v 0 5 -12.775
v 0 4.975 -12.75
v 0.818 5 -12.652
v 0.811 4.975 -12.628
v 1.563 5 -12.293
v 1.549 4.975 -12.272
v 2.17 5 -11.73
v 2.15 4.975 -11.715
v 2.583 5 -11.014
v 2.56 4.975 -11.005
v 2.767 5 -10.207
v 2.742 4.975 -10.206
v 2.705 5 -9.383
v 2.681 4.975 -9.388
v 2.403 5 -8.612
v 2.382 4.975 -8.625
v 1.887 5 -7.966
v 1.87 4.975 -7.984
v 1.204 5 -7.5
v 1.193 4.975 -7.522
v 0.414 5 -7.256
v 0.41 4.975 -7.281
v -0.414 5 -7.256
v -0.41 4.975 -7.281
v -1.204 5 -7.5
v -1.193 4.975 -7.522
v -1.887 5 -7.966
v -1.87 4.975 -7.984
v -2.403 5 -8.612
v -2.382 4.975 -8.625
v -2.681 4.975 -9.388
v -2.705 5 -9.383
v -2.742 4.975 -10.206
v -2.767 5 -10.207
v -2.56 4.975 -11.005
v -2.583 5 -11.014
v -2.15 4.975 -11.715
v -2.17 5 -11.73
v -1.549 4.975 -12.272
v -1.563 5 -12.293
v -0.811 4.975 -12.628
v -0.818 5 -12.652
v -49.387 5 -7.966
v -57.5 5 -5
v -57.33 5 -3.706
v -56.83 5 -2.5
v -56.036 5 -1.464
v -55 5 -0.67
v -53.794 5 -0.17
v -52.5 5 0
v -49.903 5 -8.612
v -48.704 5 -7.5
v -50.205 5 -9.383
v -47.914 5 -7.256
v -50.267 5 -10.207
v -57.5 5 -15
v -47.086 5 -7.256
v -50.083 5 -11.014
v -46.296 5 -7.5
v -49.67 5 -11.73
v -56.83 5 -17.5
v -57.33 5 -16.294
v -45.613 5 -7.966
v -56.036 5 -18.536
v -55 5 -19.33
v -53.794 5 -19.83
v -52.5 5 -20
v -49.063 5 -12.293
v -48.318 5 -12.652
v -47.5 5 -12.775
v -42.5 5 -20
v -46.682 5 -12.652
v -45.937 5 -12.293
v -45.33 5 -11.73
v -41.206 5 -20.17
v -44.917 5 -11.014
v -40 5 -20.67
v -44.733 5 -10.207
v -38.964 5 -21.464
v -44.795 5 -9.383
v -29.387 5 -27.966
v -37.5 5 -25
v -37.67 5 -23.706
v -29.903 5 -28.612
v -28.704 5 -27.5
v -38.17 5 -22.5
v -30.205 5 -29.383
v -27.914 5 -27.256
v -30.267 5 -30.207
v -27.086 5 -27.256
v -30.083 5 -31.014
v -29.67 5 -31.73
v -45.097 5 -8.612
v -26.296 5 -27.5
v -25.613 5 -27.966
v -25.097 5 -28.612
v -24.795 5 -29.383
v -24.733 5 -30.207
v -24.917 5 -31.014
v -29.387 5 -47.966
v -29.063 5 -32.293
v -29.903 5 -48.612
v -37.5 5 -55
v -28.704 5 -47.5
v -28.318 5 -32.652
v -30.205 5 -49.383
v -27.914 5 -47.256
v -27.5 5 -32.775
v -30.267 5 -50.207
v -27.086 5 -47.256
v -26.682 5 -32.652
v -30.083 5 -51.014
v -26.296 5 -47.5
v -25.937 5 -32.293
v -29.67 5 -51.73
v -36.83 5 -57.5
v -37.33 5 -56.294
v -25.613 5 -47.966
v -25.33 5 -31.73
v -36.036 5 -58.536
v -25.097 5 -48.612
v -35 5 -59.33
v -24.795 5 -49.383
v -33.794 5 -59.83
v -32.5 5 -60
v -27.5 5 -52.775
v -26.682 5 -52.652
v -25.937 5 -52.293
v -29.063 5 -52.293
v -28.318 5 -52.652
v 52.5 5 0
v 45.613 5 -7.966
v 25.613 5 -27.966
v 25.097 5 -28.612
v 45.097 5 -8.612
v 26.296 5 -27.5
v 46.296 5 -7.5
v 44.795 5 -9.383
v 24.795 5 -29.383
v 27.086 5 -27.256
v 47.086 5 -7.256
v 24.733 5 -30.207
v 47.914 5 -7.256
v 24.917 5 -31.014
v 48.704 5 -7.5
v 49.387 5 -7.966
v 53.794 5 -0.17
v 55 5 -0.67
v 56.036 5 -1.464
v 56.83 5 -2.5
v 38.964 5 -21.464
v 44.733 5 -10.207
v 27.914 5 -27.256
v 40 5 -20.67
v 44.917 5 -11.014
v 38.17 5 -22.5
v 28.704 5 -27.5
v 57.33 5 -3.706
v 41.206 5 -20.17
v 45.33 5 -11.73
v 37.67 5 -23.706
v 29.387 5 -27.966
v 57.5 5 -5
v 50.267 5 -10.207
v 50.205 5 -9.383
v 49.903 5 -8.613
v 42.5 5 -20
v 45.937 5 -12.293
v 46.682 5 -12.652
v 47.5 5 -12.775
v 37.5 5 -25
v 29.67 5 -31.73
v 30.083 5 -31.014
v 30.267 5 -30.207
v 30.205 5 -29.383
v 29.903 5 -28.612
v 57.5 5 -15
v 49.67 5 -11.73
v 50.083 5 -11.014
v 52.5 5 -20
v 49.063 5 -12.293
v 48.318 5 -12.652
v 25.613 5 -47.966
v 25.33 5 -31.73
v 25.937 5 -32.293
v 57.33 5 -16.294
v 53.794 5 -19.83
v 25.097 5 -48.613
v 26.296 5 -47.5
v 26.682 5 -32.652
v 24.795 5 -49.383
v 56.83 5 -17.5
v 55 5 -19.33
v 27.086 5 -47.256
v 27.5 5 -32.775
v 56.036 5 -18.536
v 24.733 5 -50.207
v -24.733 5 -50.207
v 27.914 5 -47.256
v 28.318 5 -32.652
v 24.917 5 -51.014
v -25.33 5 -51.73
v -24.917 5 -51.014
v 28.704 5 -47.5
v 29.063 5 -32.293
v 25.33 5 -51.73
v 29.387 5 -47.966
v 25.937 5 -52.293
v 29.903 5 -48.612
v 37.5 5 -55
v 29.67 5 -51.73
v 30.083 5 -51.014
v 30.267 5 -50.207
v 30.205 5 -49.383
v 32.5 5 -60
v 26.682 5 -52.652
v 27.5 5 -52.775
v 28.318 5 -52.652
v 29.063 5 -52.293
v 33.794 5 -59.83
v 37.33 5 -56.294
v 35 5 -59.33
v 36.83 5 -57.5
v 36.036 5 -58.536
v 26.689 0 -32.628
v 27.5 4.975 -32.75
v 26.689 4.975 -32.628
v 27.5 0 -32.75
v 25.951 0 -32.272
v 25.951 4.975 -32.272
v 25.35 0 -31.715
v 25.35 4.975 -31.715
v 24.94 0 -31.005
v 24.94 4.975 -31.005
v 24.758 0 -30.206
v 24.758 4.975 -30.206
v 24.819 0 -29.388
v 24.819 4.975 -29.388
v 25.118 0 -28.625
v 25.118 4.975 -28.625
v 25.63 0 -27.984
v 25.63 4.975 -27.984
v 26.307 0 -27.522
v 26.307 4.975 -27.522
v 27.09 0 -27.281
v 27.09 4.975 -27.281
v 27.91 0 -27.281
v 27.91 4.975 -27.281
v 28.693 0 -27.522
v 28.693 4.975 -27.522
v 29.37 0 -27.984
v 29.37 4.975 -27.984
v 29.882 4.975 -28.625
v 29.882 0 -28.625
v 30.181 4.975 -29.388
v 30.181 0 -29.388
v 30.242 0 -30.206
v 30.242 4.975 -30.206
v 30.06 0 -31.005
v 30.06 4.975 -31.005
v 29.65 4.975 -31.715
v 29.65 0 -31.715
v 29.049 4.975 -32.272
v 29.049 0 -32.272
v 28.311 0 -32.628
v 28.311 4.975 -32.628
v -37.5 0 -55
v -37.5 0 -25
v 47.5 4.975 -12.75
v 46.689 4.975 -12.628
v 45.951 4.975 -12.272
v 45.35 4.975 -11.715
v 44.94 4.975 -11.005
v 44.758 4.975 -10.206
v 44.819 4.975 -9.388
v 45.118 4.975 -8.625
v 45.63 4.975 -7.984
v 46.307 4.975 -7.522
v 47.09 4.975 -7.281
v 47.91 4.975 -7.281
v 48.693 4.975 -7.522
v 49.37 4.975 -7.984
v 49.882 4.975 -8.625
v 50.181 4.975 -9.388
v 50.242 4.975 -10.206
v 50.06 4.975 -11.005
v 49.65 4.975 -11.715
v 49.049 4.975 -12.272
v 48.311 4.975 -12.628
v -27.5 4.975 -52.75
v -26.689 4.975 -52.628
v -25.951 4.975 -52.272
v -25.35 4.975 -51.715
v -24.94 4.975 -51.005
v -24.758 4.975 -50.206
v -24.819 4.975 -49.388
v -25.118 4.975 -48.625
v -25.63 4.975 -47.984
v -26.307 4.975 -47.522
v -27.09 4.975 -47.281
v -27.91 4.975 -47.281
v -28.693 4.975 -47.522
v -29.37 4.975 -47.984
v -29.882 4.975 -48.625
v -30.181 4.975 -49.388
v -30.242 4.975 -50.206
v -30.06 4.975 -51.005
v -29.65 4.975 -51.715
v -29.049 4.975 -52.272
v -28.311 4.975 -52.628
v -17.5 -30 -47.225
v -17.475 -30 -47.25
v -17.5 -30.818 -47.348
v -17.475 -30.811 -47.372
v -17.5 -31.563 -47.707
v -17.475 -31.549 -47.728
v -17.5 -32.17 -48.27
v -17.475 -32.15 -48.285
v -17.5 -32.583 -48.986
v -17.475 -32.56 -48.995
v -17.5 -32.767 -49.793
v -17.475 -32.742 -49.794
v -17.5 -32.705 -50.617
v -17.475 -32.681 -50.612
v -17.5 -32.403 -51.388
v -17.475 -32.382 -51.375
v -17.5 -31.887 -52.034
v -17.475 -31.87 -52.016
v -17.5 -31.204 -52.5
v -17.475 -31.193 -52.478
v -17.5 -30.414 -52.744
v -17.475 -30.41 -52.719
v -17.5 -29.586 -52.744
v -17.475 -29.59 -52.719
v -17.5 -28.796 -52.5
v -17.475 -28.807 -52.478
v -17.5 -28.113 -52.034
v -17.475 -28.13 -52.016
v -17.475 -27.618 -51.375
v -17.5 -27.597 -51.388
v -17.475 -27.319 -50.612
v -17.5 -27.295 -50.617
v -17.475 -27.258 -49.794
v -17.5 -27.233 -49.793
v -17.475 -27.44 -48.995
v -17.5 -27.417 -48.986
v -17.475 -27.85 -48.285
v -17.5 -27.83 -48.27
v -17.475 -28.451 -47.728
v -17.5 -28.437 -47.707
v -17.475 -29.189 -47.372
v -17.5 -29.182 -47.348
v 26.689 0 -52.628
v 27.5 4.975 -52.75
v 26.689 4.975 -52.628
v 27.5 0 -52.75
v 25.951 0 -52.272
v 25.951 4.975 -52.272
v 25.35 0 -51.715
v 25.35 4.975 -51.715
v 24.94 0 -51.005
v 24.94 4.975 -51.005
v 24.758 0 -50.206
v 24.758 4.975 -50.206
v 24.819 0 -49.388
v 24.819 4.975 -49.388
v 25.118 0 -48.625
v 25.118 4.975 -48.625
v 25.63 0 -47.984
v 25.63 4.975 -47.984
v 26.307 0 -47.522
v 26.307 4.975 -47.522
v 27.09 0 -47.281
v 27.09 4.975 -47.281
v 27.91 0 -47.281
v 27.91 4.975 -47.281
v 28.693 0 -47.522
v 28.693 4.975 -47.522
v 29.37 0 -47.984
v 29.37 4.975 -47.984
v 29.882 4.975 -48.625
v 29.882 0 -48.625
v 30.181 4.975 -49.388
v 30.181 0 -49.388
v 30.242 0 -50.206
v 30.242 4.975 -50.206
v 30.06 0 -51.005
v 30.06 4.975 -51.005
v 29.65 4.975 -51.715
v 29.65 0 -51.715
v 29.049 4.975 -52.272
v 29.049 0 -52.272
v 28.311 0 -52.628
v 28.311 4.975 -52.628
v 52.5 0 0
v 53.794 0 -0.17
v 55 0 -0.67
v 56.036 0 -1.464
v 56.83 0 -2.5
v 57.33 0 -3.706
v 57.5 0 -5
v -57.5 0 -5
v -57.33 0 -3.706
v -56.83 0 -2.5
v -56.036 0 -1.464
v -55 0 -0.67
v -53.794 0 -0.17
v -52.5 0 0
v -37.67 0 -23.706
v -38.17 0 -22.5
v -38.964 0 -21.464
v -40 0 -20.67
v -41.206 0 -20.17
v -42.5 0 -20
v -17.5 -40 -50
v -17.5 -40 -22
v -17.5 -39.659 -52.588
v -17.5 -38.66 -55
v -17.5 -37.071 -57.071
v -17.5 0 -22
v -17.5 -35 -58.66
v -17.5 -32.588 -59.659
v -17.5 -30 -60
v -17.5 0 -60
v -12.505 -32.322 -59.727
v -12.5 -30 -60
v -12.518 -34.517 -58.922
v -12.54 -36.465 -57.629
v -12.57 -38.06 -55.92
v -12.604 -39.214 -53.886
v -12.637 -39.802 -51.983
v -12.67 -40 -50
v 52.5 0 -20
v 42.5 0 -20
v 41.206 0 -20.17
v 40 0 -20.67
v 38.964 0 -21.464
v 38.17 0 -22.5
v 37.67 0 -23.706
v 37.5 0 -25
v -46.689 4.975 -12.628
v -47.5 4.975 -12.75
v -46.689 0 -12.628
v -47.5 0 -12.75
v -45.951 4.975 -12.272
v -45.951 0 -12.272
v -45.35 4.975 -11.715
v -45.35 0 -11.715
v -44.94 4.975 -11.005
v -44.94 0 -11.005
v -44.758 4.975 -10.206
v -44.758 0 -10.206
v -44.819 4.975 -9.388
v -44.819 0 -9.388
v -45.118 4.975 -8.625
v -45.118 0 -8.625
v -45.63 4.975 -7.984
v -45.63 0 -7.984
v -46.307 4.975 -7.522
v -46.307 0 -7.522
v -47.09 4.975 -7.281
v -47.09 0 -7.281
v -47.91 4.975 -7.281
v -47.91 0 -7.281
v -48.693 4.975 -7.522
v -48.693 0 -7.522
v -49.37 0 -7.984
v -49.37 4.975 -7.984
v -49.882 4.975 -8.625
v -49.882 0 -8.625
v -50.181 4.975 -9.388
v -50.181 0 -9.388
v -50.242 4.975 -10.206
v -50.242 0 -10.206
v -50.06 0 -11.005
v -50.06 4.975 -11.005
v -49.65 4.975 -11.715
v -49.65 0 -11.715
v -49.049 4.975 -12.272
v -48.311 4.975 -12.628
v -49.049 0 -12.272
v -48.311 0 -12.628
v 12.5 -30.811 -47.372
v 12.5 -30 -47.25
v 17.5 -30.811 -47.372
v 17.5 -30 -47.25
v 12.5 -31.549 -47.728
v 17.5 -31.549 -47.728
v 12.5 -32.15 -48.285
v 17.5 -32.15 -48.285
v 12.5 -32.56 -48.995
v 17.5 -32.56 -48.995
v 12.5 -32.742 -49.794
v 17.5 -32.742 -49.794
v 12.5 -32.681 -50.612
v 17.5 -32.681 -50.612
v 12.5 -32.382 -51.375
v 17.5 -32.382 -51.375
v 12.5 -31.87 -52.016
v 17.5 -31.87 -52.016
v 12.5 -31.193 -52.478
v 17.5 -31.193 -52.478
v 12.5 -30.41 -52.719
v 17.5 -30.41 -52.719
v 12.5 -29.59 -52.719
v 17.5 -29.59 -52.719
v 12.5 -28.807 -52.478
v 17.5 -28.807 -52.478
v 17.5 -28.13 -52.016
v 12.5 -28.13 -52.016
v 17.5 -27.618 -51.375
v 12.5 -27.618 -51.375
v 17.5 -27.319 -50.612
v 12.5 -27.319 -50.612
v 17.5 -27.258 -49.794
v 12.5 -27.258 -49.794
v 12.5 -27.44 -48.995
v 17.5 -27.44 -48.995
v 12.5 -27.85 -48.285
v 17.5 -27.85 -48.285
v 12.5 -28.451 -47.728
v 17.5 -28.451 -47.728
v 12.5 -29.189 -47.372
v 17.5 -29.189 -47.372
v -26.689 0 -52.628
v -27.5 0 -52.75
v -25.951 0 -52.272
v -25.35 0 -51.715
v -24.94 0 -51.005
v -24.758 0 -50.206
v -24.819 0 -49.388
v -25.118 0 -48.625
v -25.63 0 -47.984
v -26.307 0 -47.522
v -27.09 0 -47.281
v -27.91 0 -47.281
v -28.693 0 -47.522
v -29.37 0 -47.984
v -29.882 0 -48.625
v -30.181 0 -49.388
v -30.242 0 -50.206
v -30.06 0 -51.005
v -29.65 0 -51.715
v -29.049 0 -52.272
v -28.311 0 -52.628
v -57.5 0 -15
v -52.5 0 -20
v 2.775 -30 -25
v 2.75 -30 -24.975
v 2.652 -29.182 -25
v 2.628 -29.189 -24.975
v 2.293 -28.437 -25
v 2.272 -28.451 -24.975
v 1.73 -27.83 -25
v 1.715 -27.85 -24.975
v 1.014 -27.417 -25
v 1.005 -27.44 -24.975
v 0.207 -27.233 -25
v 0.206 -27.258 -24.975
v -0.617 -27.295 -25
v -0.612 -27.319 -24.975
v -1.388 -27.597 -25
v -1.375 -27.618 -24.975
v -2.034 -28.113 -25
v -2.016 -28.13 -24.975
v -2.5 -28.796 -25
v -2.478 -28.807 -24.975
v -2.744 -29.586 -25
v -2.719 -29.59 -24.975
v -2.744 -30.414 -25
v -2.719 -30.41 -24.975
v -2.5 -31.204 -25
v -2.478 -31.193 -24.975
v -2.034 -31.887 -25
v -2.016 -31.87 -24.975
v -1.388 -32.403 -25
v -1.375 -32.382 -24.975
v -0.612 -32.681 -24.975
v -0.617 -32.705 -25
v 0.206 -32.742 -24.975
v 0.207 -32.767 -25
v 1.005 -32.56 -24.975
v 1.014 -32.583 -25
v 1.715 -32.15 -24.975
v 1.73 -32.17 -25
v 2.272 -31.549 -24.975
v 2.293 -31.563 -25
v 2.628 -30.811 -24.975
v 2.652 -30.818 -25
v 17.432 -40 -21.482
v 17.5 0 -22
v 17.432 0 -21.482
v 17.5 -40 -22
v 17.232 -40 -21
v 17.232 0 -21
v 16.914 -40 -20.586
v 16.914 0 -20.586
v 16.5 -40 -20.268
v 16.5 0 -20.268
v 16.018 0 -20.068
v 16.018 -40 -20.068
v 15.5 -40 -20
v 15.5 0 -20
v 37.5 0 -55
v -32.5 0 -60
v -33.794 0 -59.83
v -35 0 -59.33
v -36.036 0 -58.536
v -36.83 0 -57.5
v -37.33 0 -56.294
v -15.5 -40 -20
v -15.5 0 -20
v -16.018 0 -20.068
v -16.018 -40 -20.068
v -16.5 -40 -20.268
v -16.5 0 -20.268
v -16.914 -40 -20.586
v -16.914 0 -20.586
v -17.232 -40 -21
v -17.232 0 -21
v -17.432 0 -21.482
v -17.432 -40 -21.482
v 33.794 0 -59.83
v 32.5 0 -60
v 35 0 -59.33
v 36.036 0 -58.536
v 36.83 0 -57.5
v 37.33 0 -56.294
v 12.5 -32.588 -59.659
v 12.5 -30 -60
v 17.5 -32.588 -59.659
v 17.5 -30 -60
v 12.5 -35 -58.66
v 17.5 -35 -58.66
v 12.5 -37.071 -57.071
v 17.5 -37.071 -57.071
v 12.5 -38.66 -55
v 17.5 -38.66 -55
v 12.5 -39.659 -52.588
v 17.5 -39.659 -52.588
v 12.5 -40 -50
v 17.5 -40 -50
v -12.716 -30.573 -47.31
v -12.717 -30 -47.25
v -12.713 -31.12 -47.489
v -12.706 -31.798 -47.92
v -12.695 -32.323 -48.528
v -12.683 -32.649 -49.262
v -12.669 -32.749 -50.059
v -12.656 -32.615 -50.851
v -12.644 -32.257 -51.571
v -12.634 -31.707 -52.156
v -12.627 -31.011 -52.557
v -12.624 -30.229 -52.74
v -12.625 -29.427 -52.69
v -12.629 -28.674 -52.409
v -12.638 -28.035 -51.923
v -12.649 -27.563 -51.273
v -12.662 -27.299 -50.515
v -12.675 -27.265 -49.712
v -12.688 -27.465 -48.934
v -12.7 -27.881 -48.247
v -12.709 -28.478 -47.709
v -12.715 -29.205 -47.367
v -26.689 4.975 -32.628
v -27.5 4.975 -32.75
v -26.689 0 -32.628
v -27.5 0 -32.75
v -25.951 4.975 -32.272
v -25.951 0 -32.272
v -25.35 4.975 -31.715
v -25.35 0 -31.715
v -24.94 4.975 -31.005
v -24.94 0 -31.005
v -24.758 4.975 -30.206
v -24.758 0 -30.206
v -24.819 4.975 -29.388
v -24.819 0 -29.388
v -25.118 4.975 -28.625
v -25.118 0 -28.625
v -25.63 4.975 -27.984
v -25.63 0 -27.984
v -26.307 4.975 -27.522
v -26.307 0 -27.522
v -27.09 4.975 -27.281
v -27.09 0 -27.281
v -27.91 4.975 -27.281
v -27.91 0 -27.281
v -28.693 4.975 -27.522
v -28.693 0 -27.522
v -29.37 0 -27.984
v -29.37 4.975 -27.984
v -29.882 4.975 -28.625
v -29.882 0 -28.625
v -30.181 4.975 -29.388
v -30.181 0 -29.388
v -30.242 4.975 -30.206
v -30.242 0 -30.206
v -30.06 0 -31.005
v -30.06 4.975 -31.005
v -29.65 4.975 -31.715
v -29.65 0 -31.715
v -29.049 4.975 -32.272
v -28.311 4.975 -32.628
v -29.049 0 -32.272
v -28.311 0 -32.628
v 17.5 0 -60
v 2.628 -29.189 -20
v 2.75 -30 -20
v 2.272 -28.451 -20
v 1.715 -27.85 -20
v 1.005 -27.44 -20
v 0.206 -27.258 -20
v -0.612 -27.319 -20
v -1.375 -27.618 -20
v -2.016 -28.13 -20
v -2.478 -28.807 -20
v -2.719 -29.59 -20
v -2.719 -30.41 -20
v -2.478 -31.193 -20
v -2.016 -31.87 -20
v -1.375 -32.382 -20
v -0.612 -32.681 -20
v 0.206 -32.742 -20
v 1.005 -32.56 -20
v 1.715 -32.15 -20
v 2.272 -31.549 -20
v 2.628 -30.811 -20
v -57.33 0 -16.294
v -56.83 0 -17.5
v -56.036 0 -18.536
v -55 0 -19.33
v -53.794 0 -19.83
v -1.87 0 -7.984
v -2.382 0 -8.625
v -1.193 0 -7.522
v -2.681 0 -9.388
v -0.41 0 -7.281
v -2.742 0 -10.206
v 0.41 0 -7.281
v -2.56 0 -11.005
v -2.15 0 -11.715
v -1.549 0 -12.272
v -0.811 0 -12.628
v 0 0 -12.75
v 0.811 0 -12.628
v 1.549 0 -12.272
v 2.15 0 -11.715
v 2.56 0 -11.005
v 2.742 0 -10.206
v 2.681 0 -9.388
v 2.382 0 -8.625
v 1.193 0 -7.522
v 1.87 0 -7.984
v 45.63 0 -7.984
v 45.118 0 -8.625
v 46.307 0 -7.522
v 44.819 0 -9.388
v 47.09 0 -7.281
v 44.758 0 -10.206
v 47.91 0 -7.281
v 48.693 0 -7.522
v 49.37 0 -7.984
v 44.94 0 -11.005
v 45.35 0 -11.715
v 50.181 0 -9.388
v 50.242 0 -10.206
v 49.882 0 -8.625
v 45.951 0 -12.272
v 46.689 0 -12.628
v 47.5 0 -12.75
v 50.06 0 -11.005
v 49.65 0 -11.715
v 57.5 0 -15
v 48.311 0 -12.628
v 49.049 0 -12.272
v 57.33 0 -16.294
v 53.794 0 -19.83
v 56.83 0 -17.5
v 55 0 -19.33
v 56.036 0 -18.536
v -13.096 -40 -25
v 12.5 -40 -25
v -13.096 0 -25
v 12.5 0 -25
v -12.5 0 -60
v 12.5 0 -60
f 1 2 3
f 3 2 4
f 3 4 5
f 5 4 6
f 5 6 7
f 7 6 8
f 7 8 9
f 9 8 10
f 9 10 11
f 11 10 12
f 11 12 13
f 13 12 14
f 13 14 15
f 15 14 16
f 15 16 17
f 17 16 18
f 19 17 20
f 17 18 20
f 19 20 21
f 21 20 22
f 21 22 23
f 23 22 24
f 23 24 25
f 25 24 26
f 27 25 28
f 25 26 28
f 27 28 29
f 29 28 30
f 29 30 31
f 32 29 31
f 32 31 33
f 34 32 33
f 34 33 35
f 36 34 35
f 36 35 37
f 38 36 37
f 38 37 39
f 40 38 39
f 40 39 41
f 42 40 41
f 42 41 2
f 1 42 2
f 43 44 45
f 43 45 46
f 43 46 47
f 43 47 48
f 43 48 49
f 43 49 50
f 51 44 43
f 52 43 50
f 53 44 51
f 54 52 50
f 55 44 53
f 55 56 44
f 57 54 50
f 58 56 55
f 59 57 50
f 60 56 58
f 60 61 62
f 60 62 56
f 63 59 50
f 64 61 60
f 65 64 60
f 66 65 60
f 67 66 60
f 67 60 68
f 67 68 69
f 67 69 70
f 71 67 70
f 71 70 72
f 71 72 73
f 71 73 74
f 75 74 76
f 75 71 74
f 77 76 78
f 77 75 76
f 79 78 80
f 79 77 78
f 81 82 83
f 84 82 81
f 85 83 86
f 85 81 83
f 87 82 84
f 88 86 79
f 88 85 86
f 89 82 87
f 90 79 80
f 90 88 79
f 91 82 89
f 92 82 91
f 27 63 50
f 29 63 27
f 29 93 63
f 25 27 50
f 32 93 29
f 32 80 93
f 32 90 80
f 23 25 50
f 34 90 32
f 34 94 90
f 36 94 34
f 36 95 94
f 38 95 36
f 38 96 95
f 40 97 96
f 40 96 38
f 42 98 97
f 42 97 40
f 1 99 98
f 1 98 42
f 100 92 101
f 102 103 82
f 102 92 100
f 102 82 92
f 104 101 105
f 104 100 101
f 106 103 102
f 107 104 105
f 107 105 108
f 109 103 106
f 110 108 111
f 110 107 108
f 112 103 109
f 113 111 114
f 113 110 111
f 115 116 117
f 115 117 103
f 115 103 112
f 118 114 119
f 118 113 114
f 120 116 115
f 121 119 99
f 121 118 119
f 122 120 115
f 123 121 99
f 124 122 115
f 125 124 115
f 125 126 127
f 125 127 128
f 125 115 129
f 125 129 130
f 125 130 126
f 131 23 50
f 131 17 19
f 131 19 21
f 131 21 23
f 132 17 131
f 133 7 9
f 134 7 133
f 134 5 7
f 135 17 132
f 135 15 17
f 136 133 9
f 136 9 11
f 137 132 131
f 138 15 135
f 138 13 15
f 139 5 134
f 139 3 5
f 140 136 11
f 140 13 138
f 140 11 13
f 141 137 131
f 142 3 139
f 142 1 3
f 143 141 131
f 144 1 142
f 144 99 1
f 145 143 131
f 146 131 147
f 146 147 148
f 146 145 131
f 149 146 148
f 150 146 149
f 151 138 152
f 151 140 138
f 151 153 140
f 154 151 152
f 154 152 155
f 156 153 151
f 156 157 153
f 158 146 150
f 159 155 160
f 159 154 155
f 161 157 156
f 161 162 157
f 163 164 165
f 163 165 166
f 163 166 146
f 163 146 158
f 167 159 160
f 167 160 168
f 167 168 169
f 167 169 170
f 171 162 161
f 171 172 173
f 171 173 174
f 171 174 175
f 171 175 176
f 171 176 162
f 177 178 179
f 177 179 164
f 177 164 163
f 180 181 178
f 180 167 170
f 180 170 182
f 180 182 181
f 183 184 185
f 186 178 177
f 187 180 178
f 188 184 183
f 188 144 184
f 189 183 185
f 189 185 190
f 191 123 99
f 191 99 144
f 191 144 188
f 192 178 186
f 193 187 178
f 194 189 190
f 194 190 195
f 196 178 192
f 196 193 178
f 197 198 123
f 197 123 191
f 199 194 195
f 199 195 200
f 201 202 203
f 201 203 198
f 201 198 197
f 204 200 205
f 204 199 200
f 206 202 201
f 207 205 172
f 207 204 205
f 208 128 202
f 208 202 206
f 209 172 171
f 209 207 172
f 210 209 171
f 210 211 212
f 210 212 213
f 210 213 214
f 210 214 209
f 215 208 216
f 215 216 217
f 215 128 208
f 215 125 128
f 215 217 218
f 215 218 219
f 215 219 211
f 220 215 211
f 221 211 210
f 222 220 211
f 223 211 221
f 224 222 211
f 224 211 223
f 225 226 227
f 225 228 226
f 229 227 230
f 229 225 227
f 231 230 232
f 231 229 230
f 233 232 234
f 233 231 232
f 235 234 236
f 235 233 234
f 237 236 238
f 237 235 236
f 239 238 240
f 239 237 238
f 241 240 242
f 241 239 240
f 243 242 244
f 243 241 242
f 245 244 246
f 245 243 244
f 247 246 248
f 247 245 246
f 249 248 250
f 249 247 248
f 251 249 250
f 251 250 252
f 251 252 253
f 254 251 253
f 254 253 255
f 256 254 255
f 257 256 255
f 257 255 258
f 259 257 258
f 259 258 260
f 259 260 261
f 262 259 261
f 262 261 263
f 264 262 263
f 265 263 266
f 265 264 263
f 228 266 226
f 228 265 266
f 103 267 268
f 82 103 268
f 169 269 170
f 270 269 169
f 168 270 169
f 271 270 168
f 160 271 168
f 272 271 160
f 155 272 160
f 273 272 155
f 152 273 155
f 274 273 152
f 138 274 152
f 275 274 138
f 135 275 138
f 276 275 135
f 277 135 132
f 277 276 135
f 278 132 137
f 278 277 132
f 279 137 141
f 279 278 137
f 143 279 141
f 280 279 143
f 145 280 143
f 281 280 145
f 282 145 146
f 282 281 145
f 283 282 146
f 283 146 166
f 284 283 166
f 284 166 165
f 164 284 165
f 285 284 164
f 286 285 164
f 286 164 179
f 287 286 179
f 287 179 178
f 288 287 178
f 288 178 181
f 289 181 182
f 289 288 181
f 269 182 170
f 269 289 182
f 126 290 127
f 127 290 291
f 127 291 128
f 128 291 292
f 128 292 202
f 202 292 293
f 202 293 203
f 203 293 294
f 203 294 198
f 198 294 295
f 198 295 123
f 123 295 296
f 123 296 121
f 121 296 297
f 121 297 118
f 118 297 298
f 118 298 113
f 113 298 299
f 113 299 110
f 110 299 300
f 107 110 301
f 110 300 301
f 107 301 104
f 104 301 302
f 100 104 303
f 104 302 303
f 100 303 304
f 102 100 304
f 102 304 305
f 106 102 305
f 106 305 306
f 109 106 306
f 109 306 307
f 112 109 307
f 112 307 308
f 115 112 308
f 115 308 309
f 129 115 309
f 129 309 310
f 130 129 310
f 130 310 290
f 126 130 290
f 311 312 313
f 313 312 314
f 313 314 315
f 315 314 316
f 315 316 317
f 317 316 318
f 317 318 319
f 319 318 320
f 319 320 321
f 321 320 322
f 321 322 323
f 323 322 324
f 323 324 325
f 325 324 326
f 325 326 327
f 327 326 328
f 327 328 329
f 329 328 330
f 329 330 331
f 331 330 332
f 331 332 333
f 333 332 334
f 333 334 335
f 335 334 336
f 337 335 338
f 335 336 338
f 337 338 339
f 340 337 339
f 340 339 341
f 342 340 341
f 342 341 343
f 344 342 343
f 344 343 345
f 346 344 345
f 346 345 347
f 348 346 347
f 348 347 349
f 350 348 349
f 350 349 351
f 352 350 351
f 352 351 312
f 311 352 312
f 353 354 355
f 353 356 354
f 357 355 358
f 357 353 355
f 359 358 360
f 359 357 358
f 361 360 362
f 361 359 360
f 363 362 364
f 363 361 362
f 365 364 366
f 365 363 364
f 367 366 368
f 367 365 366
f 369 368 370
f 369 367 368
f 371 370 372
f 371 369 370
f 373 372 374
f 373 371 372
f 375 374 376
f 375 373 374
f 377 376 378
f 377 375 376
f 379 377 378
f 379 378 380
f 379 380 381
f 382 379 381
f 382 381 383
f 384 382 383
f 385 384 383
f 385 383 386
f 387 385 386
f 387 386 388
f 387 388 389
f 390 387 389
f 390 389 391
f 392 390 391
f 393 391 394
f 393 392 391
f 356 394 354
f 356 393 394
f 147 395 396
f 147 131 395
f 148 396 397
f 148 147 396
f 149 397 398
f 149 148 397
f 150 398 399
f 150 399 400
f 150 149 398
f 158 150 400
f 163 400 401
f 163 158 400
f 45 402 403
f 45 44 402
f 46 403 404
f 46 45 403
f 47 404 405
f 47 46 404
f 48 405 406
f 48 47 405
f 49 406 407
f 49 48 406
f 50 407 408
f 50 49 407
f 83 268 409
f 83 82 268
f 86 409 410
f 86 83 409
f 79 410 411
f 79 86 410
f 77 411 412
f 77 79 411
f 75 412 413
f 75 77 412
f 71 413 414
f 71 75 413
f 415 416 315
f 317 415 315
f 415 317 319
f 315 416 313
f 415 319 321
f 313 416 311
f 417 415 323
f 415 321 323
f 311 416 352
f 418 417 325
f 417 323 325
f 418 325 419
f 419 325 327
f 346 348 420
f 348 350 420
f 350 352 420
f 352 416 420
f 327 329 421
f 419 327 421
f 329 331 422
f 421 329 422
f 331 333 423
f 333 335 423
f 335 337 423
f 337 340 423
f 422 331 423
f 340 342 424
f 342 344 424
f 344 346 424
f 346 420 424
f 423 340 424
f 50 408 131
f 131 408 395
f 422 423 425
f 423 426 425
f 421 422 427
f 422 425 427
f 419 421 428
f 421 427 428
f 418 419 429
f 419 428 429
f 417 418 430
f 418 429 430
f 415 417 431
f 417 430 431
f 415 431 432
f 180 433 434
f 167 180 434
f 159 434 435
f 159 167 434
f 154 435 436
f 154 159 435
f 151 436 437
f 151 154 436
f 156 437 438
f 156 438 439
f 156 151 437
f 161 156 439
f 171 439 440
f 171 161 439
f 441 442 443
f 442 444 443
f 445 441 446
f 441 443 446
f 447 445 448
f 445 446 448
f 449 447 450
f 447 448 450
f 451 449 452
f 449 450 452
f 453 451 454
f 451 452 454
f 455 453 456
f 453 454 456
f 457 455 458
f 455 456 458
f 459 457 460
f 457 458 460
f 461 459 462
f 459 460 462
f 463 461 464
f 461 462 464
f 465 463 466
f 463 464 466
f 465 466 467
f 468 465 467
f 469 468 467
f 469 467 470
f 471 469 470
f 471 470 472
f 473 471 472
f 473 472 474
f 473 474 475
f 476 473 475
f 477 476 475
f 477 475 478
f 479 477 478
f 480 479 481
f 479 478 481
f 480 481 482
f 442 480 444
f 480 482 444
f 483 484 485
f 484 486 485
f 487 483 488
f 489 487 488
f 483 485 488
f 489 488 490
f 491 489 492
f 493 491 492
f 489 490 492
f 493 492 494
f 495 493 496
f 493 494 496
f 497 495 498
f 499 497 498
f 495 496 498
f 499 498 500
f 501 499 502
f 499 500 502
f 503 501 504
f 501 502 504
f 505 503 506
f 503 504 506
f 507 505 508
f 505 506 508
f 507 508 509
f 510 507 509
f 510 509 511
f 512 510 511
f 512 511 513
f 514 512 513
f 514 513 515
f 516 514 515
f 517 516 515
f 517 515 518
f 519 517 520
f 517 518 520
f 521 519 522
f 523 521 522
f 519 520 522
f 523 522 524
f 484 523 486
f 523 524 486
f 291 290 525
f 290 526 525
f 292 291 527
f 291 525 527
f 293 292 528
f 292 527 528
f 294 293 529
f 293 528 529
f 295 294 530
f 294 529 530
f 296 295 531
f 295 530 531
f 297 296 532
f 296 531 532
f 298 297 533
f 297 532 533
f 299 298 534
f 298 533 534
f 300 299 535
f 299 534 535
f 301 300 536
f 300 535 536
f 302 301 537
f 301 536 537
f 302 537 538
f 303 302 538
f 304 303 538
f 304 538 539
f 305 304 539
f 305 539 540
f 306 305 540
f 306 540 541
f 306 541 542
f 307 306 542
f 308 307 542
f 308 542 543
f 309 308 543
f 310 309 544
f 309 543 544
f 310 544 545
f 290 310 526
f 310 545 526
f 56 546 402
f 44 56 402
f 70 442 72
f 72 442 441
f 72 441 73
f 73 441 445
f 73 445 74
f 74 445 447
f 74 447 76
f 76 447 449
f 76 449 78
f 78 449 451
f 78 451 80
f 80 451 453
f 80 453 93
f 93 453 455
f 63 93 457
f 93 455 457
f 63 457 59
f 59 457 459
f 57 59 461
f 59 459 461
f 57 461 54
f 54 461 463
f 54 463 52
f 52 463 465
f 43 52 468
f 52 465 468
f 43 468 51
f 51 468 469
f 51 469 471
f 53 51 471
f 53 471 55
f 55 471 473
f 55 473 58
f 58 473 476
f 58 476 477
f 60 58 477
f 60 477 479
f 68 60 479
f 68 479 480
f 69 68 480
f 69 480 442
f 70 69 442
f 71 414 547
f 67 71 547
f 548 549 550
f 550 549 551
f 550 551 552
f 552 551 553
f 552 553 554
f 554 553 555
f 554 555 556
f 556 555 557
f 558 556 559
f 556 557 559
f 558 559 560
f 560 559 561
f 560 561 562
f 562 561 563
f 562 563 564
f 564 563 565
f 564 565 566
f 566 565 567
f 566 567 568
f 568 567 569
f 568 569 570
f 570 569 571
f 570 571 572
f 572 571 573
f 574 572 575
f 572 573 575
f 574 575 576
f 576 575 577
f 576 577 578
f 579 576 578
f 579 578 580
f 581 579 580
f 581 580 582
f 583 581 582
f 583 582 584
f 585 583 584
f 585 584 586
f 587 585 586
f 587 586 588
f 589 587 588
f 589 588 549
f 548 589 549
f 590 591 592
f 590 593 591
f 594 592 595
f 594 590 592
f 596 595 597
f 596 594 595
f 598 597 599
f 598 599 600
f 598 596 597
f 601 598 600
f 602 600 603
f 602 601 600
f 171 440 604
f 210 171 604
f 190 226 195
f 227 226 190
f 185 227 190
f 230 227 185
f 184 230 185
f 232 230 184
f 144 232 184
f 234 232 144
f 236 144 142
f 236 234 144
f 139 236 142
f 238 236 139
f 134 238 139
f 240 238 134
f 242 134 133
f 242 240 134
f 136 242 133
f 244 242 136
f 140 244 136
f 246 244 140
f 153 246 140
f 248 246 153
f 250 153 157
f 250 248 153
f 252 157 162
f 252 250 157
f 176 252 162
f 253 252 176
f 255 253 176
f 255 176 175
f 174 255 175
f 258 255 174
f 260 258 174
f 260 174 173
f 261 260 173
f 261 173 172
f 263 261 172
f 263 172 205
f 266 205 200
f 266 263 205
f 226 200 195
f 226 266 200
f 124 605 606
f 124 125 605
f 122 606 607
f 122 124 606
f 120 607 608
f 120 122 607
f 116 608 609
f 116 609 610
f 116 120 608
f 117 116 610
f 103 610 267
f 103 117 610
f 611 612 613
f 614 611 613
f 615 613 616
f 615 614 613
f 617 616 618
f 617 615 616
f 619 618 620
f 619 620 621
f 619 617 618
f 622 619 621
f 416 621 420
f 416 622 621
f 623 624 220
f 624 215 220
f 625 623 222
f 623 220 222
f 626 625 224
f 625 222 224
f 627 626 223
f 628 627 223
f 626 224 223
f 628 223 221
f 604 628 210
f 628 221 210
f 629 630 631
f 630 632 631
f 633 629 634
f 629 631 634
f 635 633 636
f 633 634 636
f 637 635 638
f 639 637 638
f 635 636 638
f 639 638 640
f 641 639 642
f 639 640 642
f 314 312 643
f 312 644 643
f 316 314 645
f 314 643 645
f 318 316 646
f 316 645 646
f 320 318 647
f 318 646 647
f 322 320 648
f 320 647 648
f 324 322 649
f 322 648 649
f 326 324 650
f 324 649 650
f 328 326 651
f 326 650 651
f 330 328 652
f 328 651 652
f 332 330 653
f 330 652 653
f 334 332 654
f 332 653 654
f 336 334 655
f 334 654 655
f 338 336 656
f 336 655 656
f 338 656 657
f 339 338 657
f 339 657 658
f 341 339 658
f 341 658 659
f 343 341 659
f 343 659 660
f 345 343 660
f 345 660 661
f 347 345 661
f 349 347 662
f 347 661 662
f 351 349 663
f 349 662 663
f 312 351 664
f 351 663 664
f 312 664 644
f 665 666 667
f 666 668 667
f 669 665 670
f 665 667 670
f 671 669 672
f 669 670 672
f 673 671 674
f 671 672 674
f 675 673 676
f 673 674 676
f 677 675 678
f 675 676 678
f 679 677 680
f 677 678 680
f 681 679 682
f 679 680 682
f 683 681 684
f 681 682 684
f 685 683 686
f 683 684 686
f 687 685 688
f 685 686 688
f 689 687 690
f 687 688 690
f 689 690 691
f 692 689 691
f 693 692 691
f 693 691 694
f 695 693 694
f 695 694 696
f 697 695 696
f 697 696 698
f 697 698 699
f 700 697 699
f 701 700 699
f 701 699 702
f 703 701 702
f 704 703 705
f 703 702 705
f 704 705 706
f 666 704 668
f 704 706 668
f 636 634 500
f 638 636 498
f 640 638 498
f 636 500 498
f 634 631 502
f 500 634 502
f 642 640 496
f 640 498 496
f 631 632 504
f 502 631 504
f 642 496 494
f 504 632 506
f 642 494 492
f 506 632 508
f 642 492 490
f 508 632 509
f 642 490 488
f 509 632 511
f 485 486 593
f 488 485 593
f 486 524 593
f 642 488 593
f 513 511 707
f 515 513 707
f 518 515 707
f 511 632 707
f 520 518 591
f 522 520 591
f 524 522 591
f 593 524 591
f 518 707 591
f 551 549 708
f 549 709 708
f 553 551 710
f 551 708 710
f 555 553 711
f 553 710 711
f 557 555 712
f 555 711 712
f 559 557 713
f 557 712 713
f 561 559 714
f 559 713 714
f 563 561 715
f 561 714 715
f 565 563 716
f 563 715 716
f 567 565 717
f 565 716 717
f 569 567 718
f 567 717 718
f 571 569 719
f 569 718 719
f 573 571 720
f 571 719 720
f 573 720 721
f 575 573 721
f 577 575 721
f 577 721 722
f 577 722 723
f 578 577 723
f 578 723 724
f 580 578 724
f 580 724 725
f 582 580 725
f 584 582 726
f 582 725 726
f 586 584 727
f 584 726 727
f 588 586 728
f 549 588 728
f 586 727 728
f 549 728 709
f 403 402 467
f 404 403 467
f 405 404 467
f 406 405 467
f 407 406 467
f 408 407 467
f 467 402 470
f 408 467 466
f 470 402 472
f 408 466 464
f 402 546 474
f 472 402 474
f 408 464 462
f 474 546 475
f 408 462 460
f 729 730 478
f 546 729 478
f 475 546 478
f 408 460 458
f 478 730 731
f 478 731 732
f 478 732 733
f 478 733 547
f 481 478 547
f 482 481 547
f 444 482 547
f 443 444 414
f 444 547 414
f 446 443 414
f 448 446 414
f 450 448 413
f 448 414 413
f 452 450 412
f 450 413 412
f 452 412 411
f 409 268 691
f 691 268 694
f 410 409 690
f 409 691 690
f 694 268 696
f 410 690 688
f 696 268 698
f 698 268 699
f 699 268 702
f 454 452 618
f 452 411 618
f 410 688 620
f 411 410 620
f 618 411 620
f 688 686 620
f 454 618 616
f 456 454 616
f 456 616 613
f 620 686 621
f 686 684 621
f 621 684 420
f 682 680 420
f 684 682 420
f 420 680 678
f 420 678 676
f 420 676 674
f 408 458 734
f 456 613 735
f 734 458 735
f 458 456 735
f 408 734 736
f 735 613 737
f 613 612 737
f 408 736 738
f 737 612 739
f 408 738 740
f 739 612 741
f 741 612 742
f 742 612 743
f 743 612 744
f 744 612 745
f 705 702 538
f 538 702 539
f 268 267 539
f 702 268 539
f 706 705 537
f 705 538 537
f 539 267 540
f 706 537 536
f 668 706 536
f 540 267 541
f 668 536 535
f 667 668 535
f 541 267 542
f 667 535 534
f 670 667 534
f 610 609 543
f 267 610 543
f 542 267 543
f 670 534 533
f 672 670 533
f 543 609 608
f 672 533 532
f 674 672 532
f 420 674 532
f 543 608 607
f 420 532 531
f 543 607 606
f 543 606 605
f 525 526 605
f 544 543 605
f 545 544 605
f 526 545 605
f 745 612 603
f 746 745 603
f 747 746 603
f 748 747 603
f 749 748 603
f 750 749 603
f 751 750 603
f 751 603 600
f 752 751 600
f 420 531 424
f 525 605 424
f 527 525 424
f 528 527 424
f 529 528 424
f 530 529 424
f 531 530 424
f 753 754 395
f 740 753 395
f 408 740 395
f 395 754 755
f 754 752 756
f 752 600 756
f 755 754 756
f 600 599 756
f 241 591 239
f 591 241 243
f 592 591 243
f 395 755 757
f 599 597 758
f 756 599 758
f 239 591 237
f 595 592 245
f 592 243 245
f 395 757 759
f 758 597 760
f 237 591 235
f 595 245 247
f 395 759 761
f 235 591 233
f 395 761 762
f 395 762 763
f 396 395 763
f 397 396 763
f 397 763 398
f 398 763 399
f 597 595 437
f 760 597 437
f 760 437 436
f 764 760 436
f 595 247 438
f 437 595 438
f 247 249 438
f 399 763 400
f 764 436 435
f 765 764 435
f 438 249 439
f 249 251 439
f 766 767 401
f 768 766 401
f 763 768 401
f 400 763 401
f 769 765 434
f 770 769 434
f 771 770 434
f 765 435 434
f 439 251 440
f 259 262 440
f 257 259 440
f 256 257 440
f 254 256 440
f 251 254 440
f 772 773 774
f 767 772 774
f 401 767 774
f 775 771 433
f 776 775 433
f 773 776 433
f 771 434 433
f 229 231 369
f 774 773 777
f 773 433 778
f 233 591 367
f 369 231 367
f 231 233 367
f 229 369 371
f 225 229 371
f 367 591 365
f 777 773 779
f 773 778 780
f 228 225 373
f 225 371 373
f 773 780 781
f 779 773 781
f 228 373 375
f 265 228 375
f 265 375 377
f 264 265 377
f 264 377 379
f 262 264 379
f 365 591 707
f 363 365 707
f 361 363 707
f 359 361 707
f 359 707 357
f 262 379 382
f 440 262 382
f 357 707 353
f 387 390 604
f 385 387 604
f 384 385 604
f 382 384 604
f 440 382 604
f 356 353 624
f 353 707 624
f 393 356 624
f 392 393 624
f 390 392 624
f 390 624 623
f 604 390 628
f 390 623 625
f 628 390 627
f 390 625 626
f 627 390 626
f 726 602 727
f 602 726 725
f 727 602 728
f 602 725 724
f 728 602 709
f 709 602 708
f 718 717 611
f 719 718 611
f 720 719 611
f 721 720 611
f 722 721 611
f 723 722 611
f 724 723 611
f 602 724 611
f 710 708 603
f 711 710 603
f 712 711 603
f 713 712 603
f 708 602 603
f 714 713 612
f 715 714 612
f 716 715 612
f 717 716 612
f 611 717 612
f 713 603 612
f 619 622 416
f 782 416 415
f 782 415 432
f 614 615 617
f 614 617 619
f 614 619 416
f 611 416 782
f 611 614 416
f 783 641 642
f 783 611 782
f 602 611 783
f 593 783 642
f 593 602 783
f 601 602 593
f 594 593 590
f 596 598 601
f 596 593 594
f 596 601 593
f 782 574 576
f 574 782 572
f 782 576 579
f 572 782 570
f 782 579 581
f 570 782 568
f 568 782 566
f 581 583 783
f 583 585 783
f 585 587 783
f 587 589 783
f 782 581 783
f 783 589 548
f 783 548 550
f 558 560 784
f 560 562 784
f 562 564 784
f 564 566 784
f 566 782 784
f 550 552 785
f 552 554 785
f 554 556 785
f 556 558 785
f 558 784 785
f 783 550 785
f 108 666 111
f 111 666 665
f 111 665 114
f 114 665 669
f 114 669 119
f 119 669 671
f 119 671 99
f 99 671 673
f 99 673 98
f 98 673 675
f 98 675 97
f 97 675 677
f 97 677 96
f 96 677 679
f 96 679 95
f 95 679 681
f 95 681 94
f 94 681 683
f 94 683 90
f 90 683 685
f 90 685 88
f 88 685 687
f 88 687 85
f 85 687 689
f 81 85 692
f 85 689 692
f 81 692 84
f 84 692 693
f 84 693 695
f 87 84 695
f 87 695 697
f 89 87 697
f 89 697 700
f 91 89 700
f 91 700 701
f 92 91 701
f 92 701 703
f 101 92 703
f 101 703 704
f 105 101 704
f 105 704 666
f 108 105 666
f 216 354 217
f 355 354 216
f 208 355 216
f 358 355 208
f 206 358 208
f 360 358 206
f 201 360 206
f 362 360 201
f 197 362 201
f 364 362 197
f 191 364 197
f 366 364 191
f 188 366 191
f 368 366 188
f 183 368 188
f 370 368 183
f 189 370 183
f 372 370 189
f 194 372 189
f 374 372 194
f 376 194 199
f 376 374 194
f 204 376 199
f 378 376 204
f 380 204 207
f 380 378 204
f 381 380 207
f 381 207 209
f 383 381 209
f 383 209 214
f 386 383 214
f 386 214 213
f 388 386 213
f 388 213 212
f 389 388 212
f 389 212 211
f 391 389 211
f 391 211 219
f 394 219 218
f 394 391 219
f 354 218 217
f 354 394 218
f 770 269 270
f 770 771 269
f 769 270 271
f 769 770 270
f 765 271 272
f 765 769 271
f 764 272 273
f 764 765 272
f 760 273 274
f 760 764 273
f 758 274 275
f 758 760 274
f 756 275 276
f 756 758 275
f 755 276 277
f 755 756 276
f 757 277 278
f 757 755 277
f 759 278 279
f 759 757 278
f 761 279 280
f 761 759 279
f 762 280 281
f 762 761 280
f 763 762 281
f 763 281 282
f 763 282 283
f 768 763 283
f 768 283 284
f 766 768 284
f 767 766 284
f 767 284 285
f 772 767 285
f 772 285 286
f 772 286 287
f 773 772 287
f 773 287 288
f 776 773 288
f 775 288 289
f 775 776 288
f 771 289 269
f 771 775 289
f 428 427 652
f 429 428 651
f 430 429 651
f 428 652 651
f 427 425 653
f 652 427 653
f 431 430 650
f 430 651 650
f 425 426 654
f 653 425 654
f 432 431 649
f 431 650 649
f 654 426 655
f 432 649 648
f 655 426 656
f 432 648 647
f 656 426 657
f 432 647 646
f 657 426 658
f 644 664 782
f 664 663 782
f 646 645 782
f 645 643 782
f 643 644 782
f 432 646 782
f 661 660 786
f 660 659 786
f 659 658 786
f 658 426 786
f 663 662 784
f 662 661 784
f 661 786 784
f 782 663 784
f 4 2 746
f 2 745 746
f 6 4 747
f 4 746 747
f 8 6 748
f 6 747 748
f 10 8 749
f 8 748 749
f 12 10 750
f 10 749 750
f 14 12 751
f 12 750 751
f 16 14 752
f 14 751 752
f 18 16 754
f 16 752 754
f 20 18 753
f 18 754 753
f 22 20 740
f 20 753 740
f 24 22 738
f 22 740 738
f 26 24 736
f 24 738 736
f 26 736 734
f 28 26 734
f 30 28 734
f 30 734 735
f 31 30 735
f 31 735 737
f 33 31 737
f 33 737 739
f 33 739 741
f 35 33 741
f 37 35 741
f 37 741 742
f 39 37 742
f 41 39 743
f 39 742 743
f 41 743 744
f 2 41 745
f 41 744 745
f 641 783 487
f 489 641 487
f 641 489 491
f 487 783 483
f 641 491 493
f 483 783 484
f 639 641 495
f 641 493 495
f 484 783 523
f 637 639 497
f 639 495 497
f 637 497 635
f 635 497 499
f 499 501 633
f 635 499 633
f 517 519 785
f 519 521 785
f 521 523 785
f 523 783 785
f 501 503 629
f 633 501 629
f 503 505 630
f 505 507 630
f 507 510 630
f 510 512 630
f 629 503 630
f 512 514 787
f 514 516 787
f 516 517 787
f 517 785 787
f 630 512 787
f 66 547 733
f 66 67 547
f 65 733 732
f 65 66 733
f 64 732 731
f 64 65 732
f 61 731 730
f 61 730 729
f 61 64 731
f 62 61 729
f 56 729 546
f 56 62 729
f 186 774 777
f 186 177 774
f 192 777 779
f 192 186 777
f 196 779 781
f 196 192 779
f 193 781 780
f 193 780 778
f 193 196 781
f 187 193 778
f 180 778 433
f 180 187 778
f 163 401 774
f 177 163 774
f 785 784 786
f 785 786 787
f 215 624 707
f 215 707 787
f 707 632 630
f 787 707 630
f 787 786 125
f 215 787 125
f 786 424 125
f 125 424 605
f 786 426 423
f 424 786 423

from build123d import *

# Parameters (mm, degrees)
BOSS_EXTRUDE1_DEPTH            = 5
BOSS_EXTRUDE2_DEPTH            = 40
M5_CLEARANCE_HOLE1_D           = 5.5
M5_CLEARANCE_HOLE1_CSINK_D     = 5.55
M5_CLEARANCE_HOLE1_CSINK_ANGLE = 90
M5_CLEARANCE_HOLE2_D           = 5.5
M5_CLEARANCE_HOLE2_CSINK_D     = 5.55
M5_CLEARANCE_HOLE2_CSINK_ANGLE = 90
FILLET1_R                      = 2
M5_CLEARANCE_HOLE3_D           = 5.5
M5_CLEARANCE_HOLE3_CSINK_D     = 5.55
M5_CLEARANCE_HOLE3_CSINK_ANGLE = 90
FILLET2_R                      = 5
M5_CLEARANCE_HOLE4_D           = 5.5
M5_CLEARANCE_HOLE4_CSINK_D     = 5.55
M5_CLEARANCE_HOLE4_CSINK_ANGLE = 90
M5_CLEARANCE_HOLE5_D           = 5.5
M5_CLEARANCE_HOLE5_CSINK_D     = 5.55
M5_CLEARANCE_HOLE5_CSINK_ANGLE = 90
FILLET3_R                      = 10


with BuildPart() as part:
    # Sketch2 → Boss-Extrude1 (new body)
    with BuildSketch(Plane(origin=(0, 0, 0), x_dir=(1, 0, 0), z_dir=(0, 1, 0))):
        Polygon((-57.5, 0), (57.5, 0), (57.5, 20), (37.5, 20), (37.5, 60), (-37.5, 60), (-37.5, 20), (-57.5, 20), align=None)
    extrude(amount=BOSS_EXTRUDE1_DEPTH)

    # Sketch3 → Boss-Extrude2 (add)
    with BuildSketch(Plane.XZ):
        Polygon((17.5, -60), (17.5, -20), (-17.5, -20), (-17.5, -60), (-12.5, -60), (-13.096167181, -25), (12.5, -25), (12.5, -60), align=None)
    extrude(amount=BOSS_EXTRUDE2_DEPTH)

    # M5 Clearance Hole1 (through all)
    with Locations(Plane(origin=(-27.5, 5, -50), x_dir=(0, 0, 1), z_dir=(0, 1, 0))):
        with Locations((0, 0), (20, 0)):
            m5_clearance_hole1 = CounterSinkHole(M5_CLEARANCE_HOLE1_D / 2, M5_CLEARANCE_HOLE1_CSINK_D / 2, counter_sink_angle=M5_CLEARANCE_HOLE1_CSINK_ANGLE)

    # Mirror1: M5 Clearance Hole1 across plane
    add(m5_clearance_hole1.mirror(Plane(origin=(0, 0, 0), x_dir=(0, 0, 1), z_dir=(1, 0, 0))), mode=Mode.SUBTRACT)

    # M5 Clearance Hole2 (through all)
    with Locations(Plane(origin=(-47.5, 5, -10), x_dir=(0, 0, 1), z_dir=(0, 1, 0))):
        with Locations((0, 0)):
            m5_clearance_hole2 = CounterSinkHole(M5_CLEARANCE_HOLE2_D / 2, M5_CLEARANCE_HOLE2_CSINK_D / 2, counter_sink_angle=M5_CLEARANCE_HOLE2_CSINK_ANGLE)

    # Mirror2: M5 Clearance Hole2 across plane
    add(m5_clearance_hole2.mirror(Plane(origin=(0, 0, 0), x_dir=(0, 0, 1), z_dir=(1, 0, 0))), mode=Mode.SUBTRACT)

    # Fillet1
    fillet1_edges = [part.edges().sort_by_distance(p)[0] for p in [
        (17.5, -20, -20),
        (-17.5, -20, -20),
    ]]
    fillet(fillet1_edges, radius=FILLET1_R)

    # M5 Clearance Hole3 (through all)
    with Locations(Plane(origin=(0, -30, -25), x_dir=(-1, 0, 0), z_dir=(0, 0, -1))):
        with Locations((0, 0)):
            CounterSinkHole(M5_CLEARANCE_HOLE3_D / 2, M5_CLEARANCE_HOLE3_CSINK_D / 2, counter_sink_angle=M5_CLEARANCE_HOLE3_CSINK_ANGLE)

    # Fillet2
    fillet2_edges = [part.edges().sort_by_distance(p)[0] for p in [
        (37.5, 2.5, -20),
        (57.5, 2.5, -20),
        (57.5, 2.5, 0),
        (-57.5, 2.5, 0),
        (-57.5, 2.5, -20),
        (-37.5, 2.5, -20),
        (-37.5, 2.5, -60),
        (37.5, 2.5, -60),
    ]]
    fillet(fillet2_edges, radius=FILLET2_R)

    # M5 Clearance Hole4 (through all)
    with Locations(Plane(origin=(0, 5, -10), x_dir=(0, 0, 1), z_dir=(0, 1, 0))):
        with Locations((0, 0)):
            CounterSinkHole(M5_CLEARANCE_HOLE4_D / 2, M5_CLEARANCE_HOLE4_CSINK_D / 2, counter_sink_angle=M5_CLEARANCE_HOLE4_CSINK_ANGLE)

    # M5 Clearance Hole5 (through all)
    with Locations(Plane(origin=(-17.5, -30, -50), x_dir=(0, 0, -1), z_dir=(-1, 0, 0))):
        with Locations((0, 0)):
            CounterSinkHole(M5_CLEARANCE_HOLE5_D / 2, M5_CLEARANCE_HOLE5_CSINK_D / 2, counter_sink_angle=M5_CLEARANCE_HOLE5_CSINK_ANGLE)

    # Fillet3
    fillet3_edges = [part.edges().sort_by_distance(p)[0] for p in [
        (15, -40, -60),
        (-15, -40, -60),
    ]]
    fillet(fillet3_edges, radius=FILLET3_R)


solid = part.part
